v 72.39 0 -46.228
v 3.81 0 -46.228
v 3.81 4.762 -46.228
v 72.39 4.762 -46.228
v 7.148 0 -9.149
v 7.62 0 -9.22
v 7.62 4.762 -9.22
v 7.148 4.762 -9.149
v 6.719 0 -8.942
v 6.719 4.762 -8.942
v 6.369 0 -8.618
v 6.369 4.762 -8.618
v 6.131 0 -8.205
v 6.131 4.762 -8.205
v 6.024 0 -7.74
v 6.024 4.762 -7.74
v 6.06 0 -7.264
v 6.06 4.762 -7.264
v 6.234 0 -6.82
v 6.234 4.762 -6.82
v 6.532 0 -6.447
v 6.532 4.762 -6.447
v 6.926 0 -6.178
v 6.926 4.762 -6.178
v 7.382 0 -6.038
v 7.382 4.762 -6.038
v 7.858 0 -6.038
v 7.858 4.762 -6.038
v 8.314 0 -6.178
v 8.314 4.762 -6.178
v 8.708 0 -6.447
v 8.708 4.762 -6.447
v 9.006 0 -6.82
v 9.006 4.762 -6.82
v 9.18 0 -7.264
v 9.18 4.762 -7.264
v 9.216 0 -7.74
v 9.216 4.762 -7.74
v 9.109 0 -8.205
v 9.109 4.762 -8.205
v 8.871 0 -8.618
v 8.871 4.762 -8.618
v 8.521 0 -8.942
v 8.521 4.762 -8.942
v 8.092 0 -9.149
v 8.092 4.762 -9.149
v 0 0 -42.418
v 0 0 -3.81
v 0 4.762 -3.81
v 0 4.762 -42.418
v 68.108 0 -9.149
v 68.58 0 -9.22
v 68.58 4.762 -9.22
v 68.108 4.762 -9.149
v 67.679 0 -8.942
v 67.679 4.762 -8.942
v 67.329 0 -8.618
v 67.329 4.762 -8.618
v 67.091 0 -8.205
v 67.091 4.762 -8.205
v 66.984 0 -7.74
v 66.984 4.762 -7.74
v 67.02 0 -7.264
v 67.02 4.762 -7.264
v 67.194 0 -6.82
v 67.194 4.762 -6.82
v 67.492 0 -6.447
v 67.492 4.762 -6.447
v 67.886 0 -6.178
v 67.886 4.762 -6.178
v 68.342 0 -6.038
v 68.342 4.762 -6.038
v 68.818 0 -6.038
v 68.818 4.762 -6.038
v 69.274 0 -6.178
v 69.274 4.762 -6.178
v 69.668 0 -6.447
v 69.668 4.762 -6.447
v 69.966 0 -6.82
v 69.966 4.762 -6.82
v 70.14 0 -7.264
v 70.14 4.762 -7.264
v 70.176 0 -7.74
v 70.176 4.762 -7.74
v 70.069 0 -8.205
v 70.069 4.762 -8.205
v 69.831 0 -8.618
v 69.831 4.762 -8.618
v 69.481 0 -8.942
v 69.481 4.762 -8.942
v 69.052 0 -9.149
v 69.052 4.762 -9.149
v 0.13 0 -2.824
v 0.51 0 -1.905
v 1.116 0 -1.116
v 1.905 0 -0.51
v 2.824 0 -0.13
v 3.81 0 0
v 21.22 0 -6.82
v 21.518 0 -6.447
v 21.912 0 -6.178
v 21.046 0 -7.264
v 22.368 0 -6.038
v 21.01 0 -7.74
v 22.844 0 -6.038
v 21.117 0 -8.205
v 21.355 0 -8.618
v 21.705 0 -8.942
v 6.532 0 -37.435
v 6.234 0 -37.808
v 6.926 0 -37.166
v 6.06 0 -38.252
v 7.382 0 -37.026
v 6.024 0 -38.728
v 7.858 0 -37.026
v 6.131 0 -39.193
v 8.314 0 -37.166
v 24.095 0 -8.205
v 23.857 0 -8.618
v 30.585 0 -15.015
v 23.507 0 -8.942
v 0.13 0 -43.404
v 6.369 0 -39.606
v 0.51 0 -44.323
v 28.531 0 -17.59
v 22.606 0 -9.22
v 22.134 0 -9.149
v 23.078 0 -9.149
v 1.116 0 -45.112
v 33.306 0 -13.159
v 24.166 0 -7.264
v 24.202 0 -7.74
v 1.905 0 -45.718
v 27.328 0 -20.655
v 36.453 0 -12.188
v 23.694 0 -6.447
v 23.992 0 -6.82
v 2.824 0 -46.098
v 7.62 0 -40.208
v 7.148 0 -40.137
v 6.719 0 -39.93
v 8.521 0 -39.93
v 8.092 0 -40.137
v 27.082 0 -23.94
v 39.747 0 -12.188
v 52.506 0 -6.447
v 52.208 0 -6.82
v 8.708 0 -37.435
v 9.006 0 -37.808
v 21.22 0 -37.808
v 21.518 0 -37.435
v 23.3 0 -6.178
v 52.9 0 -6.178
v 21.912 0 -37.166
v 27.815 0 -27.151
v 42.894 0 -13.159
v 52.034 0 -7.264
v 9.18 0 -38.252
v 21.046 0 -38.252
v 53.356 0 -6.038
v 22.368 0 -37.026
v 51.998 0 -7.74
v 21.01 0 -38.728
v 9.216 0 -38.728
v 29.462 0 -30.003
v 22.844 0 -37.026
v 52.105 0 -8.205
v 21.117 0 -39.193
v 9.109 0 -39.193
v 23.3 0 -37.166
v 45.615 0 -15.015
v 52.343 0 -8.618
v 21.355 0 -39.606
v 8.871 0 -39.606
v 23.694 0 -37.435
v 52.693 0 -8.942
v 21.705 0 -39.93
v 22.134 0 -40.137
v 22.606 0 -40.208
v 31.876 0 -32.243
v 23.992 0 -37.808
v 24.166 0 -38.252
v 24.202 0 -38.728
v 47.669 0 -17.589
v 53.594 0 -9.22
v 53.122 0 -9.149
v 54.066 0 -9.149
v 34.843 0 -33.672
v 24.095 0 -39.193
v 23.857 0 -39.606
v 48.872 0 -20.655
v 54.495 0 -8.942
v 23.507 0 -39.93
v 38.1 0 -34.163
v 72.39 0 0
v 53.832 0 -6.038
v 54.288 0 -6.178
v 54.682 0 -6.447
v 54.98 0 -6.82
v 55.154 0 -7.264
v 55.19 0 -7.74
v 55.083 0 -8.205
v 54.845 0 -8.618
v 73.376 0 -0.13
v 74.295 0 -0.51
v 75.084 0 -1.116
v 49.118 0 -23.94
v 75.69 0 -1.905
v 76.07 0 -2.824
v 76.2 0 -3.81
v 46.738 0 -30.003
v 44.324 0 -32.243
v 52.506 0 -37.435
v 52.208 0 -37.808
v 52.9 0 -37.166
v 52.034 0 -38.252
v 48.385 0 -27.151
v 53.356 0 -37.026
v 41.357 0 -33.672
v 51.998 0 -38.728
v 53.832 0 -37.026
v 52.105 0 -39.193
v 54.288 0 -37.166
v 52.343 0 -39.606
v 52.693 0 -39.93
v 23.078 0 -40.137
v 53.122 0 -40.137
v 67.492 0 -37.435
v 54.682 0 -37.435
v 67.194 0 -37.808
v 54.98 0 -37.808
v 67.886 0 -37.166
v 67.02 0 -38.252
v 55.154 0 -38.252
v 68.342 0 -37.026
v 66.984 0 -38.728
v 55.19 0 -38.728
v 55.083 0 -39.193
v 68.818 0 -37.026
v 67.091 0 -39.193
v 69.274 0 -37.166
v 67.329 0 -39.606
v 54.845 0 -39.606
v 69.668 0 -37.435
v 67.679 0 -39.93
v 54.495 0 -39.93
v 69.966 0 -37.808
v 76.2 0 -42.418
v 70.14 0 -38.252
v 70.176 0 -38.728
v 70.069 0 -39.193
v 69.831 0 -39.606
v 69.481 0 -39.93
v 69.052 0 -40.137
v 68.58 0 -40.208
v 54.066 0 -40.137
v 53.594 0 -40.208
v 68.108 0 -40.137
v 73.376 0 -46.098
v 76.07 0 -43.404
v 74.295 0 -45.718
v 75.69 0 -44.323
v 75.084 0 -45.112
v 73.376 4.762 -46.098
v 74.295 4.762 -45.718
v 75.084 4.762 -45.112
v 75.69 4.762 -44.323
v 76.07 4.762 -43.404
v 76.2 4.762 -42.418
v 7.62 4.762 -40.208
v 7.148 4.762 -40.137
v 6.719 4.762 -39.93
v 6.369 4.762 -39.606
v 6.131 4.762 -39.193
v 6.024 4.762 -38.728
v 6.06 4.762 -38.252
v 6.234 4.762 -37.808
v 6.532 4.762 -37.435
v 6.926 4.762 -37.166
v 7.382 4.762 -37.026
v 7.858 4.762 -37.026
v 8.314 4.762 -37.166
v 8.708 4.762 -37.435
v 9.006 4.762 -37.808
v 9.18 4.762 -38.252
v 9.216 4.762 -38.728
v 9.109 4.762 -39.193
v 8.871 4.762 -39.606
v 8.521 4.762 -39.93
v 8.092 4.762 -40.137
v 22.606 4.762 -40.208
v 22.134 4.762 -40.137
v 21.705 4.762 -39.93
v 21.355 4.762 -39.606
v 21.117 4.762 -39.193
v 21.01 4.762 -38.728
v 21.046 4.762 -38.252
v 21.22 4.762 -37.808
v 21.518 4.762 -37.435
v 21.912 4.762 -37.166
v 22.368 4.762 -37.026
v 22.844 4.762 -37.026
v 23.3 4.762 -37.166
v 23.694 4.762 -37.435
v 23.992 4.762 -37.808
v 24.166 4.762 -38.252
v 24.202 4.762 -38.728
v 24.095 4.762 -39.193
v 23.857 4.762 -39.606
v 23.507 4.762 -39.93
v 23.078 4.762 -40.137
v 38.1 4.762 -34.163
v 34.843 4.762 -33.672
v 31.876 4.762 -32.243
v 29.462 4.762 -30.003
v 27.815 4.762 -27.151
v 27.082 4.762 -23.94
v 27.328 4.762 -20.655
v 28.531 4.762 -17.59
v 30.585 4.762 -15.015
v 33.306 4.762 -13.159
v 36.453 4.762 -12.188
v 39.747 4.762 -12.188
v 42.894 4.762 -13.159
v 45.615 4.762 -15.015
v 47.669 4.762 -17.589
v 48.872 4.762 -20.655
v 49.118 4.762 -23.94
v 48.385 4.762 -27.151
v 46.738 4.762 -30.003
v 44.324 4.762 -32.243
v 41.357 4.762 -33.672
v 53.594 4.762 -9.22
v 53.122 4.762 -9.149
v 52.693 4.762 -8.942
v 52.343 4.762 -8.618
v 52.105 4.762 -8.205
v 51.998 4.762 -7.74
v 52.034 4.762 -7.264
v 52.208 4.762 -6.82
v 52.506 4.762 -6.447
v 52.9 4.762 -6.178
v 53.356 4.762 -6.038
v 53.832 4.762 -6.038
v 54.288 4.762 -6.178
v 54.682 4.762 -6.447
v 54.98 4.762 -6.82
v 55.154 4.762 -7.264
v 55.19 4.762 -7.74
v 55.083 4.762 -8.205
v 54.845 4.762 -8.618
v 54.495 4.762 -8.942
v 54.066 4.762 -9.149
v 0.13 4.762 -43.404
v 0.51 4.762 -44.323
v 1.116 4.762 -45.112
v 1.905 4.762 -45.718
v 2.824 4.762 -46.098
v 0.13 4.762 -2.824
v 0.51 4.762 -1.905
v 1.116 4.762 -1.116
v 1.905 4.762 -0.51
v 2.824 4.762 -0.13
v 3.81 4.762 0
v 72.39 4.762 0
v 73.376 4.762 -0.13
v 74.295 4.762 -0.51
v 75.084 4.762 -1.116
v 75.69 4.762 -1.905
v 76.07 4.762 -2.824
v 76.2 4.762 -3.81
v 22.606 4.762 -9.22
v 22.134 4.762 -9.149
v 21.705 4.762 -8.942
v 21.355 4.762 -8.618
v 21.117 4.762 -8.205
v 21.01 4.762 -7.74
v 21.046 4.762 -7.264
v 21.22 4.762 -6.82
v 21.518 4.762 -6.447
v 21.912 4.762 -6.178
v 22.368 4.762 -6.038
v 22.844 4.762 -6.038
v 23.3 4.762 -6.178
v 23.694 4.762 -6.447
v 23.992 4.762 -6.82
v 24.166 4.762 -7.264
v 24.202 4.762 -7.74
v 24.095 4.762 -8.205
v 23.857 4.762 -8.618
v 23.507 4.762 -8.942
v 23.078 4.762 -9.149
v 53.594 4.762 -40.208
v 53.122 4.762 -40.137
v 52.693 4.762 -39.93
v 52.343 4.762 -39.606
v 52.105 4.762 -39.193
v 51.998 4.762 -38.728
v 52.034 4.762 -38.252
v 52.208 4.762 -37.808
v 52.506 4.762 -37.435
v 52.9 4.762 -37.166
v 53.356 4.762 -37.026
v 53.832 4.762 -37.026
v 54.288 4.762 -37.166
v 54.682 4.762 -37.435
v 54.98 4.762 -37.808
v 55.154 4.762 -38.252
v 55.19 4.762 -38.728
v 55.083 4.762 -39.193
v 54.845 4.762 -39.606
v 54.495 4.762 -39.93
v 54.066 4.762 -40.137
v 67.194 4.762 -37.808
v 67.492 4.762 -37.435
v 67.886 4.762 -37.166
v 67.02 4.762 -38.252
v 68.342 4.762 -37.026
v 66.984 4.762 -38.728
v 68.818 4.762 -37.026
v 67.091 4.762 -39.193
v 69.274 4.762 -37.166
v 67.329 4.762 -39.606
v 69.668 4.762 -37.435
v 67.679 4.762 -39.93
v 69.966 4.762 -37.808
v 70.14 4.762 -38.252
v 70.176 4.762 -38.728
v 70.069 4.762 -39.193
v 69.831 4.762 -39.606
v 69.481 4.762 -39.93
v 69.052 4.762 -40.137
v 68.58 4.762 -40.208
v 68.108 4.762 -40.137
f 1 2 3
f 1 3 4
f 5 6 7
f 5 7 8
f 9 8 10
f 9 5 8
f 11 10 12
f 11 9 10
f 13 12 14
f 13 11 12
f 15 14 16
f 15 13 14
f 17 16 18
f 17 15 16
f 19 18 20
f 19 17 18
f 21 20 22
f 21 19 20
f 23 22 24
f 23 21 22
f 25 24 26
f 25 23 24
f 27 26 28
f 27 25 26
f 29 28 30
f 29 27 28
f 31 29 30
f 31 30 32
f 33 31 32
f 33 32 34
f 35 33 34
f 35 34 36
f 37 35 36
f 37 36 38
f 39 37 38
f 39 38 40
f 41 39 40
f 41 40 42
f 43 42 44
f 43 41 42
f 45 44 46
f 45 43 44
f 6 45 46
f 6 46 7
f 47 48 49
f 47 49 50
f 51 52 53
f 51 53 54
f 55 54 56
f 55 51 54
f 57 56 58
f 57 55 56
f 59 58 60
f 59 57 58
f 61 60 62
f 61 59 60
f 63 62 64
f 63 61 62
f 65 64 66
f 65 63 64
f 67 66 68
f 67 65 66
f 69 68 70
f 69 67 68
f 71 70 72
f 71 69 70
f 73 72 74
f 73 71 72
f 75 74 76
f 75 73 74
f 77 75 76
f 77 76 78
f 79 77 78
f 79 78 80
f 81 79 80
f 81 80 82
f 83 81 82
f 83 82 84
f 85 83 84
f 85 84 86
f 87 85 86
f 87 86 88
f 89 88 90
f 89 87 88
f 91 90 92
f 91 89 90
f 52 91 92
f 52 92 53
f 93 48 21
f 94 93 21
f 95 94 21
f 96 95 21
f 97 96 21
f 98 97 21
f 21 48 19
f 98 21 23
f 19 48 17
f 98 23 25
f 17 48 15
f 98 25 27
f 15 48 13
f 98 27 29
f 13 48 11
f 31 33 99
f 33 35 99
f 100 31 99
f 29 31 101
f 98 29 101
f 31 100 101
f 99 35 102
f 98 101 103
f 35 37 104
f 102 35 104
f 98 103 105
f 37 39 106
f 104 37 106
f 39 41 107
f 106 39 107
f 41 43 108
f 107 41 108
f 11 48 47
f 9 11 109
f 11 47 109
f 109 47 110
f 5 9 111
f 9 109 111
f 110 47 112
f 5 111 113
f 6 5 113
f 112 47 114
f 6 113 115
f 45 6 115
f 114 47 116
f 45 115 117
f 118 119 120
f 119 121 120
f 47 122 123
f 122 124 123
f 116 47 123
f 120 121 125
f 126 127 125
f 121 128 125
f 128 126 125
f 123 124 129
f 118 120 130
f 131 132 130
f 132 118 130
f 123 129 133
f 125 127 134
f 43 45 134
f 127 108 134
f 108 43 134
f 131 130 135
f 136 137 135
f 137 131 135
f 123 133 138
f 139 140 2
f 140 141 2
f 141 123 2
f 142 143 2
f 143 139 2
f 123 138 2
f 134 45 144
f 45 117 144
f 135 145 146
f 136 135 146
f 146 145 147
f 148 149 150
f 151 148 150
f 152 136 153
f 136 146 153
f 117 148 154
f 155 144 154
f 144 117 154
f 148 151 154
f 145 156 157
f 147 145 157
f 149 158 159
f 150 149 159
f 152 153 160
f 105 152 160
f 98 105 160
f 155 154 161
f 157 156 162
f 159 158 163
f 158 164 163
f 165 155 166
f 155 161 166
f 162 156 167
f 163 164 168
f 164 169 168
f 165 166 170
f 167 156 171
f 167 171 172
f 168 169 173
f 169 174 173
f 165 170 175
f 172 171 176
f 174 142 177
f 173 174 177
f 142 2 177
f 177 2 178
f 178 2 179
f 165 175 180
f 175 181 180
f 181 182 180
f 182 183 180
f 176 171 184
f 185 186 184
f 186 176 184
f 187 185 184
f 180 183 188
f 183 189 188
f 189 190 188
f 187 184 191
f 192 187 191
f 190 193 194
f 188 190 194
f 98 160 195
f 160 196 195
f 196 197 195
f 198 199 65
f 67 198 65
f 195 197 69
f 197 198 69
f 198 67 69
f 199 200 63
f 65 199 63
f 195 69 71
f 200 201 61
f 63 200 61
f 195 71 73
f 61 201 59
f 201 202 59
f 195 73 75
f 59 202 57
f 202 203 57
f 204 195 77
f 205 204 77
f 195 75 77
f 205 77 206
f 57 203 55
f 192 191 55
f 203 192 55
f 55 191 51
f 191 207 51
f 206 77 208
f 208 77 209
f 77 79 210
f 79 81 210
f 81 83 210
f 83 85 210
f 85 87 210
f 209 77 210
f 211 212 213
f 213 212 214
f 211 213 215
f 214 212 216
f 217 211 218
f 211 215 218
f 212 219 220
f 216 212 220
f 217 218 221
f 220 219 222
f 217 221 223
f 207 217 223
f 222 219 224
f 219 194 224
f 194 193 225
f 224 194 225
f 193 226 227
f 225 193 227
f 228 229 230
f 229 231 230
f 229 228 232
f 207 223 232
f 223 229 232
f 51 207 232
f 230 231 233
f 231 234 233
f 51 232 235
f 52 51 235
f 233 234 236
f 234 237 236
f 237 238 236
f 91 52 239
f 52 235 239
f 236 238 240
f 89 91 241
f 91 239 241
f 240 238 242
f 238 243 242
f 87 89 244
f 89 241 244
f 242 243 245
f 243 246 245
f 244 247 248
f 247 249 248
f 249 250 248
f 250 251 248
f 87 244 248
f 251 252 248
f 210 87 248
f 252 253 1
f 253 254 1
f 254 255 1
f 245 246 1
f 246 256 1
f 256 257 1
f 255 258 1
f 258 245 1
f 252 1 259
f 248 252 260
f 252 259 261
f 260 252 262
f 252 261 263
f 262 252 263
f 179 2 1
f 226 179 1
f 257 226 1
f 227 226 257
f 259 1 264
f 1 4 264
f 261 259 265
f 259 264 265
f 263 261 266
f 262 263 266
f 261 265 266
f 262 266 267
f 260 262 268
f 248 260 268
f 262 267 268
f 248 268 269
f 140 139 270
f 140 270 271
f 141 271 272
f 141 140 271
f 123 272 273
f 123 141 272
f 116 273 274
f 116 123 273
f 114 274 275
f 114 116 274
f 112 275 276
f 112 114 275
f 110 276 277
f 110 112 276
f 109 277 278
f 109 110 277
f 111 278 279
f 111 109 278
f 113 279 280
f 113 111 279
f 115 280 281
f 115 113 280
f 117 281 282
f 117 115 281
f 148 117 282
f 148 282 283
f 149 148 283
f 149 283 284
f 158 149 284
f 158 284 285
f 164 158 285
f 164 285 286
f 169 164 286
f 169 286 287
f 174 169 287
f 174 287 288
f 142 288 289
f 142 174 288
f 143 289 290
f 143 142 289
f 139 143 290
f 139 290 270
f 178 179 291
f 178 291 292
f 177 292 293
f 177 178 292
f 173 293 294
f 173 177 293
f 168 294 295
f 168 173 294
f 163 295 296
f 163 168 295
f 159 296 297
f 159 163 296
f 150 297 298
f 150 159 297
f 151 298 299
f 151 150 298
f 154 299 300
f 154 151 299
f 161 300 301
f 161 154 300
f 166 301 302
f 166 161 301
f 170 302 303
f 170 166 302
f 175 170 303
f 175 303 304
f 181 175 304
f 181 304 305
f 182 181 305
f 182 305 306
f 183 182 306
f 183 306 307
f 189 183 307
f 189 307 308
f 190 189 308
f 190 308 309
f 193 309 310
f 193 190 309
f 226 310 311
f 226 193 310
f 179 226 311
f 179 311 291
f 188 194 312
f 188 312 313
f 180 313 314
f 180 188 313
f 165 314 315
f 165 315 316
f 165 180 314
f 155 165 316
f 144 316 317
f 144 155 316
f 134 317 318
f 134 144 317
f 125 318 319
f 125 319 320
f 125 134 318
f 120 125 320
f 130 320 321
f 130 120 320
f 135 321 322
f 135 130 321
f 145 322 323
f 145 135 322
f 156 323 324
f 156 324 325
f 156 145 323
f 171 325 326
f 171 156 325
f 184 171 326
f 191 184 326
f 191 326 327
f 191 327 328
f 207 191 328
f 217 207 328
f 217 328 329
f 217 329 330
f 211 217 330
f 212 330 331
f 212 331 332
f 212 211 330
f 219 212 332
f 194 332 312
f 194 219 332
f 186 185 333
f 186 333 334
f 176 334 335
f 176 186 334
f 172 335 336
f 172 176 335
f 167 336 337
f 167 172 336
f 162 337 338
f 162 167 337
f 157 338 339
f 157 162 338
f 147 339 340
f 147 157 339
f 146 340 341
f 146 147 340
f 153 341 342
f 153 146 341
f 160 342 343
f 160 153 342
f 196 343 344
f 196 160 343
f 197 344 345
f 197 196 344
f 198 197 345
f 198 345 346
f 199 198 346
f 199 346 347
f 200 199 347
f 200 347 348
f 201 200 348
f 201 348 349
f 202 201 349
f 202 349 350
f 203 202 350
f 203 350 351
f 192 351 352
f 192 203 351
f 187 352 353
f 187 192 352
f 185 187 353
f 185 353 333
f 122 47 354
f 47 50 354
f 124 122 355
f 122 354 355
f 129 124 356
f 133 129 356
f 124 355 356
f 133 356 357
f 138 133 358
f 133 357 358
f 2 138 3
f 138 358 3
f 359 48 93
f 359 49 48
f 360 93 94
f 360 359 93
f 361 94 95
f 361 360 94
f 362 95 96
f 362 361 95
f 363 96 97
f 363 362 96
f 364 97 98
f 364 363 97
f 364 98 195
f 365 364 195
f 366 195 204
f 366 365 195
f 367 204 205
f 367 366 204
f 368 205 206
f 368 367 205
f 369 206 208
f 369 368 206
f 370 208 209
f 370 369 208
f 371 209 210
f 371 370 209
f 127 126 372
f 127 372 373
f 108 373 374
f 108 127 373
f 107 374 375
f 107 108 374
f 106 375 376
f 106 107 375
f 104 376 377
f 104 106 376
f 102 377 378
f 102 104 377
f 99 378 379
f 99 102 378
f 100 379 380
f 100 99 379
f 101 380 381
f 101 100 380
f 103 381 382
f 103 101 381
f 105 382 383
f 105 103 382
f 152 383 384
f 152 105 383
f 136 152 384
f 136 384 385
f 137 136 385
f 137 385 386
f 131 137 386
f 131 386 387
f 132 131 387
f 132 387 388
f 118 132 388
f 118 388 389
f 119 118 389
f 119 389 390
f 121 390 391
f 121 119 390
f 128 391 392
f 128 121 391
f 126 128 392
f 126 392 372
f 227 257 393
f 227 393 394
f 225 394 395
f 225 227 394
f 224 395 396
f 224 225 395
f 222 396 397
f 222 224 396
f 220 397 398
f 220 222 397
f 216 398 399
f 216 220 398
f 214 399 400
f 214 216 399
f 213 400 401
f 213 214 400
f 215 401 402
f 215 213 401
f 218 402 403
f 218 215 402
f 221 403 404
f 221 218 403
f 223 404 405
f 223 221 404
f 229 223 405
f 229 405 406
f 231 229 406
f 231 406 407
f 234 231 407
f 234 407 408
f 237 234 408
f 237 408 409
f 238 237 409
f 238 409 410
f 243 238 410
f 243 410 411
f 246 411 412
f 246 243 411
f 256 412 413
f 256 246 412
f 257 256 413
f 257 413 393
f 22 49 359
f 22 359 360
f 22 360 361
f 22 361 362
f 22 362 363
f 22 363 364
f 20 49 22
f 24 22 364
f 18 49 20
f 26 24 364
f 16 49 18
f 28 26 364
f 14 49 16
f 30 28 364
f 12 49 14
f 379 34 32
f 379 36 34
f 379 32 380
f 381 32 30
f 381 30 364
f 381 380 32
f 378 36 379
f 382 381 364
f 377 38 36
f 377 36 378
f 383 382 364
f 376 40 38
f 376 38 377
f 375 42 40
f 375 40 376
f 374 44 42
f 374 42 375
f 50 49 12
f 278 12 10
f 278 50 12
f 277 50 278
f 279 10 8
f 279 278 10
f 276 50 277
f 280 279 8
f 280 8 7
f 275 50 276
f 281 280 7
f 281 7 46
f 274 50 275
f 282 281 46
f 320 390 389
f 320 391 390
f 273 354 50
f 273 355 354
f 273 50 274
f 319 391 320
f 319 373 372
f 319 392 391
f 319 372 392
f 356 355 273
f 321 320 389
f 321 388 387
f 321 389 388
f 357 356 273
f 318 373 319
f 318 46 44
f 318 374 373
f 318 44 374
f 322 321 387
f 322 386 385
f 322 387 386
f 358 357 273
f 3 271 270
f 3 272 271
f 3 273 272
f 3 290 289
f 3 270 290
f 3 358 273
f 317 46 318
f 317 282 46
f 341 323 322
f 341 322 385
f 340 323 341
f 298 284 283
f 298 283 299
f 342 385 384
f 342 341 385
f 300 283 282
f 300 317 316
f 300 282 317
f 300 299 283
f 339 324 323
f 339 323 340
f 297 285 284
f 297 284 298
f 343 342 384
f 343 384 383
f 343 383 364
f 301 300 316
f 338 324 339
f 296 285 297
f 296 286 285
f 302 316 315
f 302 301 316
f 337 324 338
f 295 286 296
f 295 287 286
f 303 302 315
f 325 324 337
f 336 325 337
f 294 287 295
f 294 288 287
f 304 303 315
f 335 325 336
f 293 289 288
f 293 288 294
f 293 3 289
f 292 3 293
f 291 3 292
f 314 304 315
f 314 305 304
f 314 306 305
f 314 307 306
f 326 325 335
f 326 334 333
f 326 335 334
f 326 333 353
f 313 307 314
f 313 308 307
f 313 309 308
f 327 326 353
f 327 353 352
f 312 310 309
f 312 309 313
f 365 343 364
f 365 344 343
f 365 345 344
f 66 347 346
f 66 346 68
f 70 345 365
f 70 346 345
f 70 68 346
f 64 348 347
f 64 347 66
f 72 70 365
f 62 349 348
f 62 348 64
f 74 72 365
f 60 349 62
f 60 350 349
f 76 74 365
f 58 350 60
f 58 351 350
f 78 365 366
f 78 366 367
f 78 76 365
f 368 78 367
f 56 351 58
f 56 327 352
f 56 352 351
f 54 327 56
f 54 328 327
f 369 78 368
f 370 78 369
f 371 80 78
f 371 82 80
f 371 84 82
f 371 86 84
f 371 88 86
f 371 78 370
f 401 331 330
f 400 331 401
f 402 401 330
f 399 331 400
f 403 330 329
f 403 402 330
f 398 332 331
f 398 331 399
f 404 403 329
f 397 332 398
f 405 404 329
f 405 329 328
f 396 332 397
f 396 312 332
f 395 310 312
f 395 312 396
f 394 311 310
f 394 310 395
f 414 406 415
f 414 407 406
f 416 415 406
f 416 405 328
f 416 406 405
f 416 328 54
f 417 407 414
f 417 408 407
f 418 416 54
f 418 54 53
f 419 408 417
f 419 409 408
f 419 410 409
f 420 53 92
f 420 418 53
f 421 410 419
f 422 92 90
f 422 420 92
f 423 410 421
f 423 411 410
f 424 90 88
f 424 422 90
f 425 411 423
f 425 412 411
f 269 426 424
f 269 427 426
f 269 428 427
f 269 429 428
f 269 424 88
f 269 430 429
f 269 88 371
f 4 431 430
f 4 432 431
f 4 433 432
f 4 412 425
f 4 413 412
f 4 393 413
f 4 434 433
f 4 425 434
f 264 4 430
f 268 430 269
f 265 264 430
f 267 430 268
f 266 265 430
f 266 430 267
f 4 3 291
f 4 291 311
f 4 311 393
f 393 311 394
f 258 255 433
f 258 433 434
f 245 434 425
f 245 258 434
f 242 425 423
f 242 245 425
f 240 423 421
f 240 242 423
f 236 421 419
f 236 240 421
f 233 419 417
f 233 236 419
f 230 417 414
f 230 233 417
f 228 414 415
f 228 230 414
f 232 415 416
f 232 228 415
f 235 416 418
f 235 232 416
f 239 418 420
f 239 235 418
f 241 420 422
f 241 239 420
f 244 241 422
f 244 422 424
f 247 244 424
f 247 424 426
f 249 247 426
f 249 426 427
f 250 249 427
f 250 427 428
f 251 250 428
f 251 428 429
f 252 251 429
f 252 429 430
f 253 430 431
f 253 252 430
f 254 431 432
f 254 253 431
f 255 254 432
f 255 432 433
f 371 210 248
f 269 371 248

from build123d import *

# Parameters (mm, degrees)
SKETCH1_W           = 76.2
SKETCH1_H           = 46.228
SKETCH1_R           = 1.6
SKETCH1_R_2         = 11.049
BOSS_EXTRUDE1_DEPTH = 4.7625
FILLET1_R           = 3.81


with BuildPart() as part:
    # Sketch1 → Boss-Extrude1 (new body)
    with BuildSketch(Plane(origin=(0, 0, 0), x_dir=(1, 0, 0), z_dir=(0, 1, 0))):
        with Locations((38.1, 23.114)):
            Rectangle(SKETCH1_W, SKETCH1_H)
        with Locations(Location((68.58, 38.608, 0), (0, 0, 90))):
            Circle(SKETCH1_R, mode=Mode.SUBTRACT)
        with Locations(Location((7.62, 38.608, 0), (0, 0, 90))):
            Circle(SKETCH1_R, mode=Mode.SUBTRACT)
        with Locations(Location((68.58, 7.62, 0), (0, 0, 90))):
            Circle(SKETCH1_R, mode=Mode.SUBTRACT)
        with Locations(Location((7.62, 7.62, 0), (0, 0, 90))):
            Circle(SKETCH1_R, mode=Mode.SUBTRACT)
        with Locations(Location((38.1, 23.114, 0), (0, 0, 90))):
            Circle(SKETCH1_R_2, mode=Mode.SUBTRACT)
        with Locations(Location((22.606, 38.608, 0), (0, 0, 90))):
            Circle(SKETCH1_R, mode=Mode.SUBTRACT)
        with Locations(Location((53.594, 38.608, 0), (0, 0, 90))):
            Circle(SKETCH1_R, mode=Mode.SUBTRACT)
        with Locations(Location((22.606, 7.62, 0), (0, 0, 90))):
            Circle(SKETCH1_R, mode=Mode.SUBTRACT)
        with Locations(Location((53.594, 7.62, 0), (0, 0, 90))):
            Circle(SKETCH1_R, mode=Mode.SUBTRACT)
    extrude(amount=BOSS_EXTRUDE1_DEPTH)

    # Fillet1
    fillet1_edges = [part.edges().sort_by_distance(p)[0] for p in [
        (0, 2.38125, -46.228),
        (76.2, 2.38125, -46.228),
        (76.2, 2.38125, 0),
        (0, 2.38125, 0),
    ]]
    fillet(fillet1_edges, radius=FILLET1_R)


solid = part.part
